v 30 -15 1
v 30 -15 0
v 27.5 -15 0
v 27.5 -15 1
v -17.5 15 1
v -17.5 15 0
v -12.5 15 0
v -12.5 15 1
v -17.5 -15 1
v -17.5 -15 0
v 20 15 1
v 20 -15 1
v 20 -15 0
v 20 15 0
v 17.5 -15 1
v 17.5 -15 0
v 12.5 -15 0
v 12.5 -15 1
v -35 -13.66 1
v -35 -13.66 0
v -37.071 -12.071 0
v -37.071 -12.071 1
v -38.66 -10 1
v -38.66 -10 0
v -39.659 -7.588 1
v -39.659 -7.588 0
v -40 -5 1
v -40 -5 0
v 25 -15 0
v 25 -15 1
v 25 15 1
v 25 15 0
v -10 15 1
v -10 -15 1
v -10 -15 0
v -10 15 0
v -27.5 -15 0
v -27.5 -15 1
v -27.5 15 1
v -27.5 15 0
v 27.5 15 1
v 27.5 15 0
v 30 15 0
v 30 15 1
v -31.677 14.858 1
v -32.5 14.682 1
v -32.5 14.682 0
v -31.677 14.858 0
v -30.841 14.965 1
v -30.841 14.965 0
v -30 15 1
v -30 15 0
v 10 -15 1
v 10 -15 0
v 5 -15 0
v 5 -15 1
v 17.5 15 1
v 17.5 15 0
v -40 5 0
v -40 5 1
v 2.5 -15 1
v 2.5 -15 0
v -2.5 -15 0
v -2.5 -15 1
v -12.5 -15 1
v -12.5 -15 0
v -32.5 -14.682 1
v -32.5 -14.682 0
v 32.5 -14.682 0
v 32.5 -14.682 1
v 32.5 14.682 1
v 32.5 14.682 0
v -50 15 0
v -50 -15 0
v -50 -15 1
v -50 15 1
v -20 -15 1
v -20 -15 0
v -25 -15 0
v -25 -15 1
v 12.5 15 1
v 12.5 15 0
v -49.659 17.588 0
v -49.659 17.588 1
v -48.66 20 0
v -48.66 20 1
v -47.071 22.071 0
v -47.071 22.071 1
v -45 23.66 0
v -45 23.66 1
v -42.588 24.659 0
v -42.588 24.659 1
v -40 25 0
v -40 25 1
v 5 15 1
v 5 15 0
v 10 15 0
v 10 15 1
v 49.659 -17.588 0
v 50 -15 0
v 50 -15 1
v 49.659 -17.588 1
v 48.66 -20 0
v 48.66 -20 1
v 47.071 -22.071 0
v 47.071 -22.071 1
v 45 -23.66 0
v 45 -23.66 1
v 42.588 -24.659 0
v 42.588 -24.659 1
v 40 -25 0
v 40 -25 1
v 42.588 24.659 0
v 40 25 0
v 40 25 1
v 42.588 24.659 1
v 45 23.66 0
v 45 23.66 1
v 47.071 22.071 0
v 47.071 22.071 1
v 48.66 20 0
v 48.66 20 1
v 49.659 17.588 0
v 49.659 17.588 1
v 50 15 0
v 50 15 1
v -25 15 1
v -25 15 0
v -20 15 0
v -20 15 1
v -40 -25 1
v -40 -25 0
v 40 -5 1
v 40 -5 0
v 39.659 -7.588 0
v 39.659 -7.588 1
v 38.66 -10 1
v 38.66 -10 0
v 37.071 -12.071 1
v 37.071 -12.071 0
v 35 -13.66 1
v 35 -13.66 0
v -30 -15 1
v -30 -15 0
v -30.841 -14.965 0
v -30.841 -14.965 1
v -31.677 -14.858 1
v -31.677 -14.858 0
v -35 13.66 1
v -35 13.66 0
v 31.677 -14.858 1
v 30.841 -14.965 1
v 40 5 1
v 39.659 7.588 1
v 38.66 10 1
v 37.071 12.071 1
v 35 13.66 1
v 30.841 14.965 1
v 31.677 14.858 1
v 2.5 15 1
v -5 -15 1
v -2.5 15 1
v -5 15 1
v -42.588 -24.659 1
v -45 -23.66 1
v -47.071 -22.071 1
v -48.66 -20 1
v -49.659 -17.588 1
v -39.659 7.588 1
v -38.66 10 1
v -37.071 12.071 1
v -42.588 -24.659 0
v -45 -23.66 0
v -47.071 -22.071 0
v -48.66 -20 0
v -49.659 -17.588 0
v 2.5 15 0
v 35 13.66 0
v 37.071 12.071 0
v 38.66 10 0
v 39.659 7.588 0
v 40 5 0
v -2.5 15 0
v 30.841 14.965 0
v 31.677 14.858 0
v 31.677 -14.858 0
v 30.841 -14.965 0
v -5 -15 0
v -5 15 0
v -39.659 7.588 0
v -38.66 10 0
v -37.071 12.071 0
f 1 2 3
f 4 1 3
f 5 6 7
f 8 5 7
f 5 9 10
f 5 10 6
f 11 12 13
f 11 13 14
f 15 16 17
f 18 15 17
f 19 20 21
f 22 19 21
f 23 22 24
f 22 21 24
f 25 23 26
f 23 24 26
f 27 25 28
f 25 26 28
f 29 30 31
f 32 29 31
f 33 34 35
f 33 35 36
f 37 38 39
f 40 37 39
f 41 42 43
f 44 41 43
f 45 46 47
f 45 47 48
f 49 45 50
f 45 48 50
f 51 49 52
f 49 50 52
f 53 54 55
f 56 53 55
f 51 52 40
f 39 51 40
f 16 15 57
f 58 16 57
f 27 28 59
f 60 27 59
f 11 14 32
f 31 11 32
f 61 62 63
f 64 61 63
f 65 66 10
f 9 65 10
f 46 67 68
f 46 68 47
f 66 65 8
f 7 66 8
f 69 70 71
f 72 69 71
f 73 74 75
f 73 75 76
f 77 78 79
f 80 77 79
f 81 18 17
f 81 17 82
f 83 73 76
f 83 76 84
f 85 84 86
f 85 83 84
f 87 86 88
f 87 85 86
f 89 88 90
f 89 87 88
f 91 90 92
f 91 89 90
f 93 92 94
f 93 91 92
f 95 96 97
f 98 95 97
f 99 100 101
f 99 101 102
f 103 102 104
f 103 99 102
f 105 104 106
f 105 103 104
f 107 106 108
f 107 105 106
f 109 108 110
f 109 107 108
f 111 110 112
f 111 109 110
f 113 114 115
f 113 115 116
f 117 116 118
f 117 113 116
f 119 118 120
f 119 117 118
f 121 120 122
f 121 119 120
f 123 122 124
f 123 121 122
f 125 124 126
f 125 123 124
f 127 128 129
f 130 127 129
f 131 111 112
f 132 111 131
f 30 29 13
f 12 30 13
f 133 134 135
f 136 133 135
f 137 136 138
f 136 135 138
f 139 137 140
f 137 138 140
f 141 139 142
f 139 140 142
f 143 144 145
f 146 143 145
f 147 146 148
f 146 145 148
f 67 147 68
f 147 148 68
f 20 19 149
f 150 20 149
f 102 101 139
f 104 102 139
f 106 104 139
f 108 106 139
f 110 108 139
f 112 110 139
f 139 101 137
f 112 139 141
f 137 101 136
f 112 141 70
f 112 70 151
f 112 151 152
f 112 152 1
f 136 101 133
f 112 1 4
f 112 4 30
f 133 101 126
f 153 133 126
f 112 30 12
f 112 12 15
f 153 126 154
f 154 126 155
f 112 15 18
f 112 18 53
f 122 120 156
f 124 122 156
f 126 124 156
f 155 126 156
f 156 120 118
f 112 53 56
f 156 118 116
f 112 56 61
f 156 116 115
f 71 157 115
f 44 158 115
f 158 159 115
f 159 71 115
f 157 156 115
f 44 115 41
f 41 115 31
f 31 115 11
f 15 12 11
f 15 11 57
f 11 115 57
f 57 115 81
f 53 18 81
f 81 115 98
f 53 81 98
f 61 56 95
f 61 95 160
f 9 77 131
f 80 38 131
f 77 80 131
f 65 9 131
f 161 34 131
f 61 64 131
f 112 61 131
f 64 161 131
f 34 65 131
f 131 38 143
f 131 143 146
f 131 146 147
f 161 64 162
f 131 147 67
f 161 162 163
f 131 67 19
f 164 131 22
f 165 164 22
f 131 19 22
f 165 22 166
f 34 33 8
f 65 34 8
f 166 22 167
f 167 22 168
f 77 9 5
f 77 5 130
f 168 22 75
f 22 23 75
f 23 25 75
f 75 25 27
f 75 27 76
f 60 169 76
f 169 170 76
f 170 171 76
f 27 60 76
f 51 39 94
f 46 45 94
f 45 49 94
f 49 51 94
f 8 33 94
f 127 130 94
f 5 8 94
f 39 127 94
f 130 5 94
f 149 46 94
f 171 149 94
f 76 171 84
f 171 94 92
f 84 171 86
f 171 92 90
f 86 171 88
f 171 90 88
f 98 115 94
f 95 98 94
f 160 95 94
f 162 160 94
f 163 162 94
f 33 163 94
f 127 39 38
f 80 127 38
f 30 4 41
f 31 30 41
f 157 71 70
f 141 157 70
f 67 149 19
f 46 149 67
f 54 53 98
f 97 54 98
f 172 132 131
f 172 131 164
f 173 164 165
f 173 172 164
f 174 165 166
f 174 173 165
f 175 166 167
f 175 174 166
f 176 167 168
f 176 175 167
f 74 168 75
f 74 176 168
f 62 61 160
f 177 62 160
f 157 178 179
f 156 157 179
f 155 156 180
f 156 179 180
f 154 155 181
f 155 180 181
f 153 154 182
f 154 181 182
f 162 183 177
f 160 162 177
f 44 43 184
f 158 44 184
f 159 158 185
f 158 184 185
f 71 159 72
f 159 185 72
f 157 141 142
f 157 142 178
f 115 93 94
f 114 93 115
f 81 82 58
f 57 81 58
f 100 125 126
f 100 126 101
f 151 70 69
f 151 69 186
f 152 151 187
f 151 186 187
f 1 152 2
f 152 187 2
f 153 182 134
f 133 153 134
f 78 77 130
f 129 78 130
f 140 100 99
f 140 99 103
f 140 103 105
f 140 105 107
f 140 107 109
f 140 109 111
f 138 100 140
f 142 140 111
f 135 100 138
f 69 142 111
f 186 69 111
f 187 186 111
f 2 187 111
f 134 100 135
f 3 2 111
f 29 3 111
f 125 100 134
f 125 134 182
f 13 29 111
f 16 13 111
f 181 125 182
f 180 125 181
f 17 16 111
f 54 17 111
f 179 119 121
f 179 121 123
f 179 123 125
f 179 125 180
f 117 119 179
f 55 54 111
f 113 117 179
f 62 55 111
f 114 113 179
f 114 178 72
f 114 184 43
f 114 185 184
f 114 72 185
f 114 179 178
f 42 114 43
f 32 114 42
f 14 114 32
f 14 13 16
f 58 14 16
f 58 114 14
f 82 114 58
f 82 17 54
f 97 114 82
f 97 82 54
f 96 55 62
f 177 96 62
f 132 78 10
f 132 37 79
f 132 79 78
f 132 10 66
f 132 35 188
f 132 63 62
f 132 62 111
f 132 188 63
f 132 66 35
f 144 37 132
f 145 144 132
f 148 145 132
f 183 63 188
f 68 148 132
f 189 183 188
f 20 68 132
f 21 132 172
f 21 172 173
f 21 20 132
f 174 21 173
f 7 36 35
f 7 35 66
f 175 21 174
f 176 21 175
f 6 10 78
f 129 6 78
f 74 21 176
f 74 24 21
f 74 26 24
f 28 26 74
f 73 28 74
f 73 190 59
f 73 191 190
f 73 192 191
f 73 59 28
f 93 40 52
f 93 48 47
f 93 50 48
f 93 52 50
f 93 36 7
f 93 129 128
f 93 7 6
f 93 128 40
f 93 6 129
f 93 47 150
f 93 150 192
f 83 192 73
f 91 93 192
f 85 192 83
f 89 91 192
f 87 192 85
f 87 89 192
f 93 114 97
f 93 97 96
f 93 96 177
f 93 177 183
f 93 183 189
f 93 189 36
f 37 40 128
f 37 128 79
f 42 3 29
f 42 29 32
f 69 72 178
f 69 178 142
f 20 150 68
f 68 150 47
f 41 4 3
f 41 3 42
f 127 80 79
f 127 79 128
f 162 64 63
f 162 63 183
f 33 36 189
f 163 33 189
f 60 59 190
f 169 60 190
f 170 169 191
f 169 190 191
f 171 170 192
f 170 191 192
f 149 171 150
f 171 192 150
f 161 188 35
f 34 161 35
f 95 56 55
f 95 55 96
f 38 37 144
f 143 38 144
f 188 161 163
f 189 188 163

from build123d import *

# Parameters (mm, degrees)
BOSS_EXTRUDE1_DEPTH = 1
SKETCH3_W           = 2.5
SKETCH3_H           = 30
BOSS_EXTRUDE2_DEPTH = 1


with BuildPart() as part:
    # Sketch1 → Boss-Extrude1 (new body)
    with BuildSketch(Plane.XY):
        with BuildLine():
            Line((-40, 25), (40, 25))
            ThreePointArc((40, 25), (47.071067812, 22.071067812), (50, 15))
            Line((50, 15), (50, -15))
            ThreePointArc((50, -15), (47.071067812, -22.071067812), (40, -25))
            Line((40, -25), (-40, -25))
            ThreePointArc((-40, -25), (-47.071067812, -22.071067812), (-50, -15))
            Line((-50, -15), (-50, 15))
            ThreePointArc((-50, 15), (-47.071067812, 22.071067812), (-40, 25))
        make_face()
        with BuildLine():
            Line((-30, 15), (30, 15))
            ThreePointArc((30, 15), (37.071067812, 12.071067812), (40, 5))
            Line((40, 5), (40, -5))
            ThreePointArc((40, -5), (37.071067812, -12.071067812), (30, -15))
            Line((30, -15), (-30, -15))
            ThreePointArc((-30, -15), (-37.071067812, -12.071067812), (-40, -5))
            Line((-40, -5), (-40, 5))
            ThreePointArc((-40, 5), (-37.071067812, 12.071067812), (-30, 15))
        make_face(mode=Mode.SUBTRACT)
    extrude(amount=BOSS_EXTRUDE1_DEPTH)

    # Sketch3 → Boss-Extrude2 (add)
    with BuildSketch(Plane.XY.offset(1)):
        with Locations((-33.75, 0)):
            Rectangle(SKETCH3_W, SKETCH3_H)
        with Locations((-26.25, 0)):
            Rectangle(SKETCH3_W, SKETCH3_H)
        with Locations((-18.75, 0)):
            Rectangle(SKETCH3_W, SKETCH3_H)
        with Locations((-11.25, 0)):
            Rectangle(SKETCH3_W, SKETCH3_H)
        with Locations((-3.75, 0)):
            Rectangle(SKETCH3_W, SKETCH3_H)
        with Locations((3.75, 0)):
            Rectangle(SKETCH3_W, SKETCH3_H)
        with Locations((11.25, 0)):
            Rectangle(SKETCH3_W, SKETCH3_H)
        with Locations((18.75, 0)):
            Rectangle(SKETCH3_W, SKETCH3_H)
        with Locations((26.25, 0)):
            Rectangle(SKETCH3_W, SKETCH3_H)
        with Locations((33.75, 0)):
            Rectangle(SKETCH3_W, SKETCH3_H)
    extrude(amount=-BOSS_EXTRUDE2_DEPTH)


solid = part.part
